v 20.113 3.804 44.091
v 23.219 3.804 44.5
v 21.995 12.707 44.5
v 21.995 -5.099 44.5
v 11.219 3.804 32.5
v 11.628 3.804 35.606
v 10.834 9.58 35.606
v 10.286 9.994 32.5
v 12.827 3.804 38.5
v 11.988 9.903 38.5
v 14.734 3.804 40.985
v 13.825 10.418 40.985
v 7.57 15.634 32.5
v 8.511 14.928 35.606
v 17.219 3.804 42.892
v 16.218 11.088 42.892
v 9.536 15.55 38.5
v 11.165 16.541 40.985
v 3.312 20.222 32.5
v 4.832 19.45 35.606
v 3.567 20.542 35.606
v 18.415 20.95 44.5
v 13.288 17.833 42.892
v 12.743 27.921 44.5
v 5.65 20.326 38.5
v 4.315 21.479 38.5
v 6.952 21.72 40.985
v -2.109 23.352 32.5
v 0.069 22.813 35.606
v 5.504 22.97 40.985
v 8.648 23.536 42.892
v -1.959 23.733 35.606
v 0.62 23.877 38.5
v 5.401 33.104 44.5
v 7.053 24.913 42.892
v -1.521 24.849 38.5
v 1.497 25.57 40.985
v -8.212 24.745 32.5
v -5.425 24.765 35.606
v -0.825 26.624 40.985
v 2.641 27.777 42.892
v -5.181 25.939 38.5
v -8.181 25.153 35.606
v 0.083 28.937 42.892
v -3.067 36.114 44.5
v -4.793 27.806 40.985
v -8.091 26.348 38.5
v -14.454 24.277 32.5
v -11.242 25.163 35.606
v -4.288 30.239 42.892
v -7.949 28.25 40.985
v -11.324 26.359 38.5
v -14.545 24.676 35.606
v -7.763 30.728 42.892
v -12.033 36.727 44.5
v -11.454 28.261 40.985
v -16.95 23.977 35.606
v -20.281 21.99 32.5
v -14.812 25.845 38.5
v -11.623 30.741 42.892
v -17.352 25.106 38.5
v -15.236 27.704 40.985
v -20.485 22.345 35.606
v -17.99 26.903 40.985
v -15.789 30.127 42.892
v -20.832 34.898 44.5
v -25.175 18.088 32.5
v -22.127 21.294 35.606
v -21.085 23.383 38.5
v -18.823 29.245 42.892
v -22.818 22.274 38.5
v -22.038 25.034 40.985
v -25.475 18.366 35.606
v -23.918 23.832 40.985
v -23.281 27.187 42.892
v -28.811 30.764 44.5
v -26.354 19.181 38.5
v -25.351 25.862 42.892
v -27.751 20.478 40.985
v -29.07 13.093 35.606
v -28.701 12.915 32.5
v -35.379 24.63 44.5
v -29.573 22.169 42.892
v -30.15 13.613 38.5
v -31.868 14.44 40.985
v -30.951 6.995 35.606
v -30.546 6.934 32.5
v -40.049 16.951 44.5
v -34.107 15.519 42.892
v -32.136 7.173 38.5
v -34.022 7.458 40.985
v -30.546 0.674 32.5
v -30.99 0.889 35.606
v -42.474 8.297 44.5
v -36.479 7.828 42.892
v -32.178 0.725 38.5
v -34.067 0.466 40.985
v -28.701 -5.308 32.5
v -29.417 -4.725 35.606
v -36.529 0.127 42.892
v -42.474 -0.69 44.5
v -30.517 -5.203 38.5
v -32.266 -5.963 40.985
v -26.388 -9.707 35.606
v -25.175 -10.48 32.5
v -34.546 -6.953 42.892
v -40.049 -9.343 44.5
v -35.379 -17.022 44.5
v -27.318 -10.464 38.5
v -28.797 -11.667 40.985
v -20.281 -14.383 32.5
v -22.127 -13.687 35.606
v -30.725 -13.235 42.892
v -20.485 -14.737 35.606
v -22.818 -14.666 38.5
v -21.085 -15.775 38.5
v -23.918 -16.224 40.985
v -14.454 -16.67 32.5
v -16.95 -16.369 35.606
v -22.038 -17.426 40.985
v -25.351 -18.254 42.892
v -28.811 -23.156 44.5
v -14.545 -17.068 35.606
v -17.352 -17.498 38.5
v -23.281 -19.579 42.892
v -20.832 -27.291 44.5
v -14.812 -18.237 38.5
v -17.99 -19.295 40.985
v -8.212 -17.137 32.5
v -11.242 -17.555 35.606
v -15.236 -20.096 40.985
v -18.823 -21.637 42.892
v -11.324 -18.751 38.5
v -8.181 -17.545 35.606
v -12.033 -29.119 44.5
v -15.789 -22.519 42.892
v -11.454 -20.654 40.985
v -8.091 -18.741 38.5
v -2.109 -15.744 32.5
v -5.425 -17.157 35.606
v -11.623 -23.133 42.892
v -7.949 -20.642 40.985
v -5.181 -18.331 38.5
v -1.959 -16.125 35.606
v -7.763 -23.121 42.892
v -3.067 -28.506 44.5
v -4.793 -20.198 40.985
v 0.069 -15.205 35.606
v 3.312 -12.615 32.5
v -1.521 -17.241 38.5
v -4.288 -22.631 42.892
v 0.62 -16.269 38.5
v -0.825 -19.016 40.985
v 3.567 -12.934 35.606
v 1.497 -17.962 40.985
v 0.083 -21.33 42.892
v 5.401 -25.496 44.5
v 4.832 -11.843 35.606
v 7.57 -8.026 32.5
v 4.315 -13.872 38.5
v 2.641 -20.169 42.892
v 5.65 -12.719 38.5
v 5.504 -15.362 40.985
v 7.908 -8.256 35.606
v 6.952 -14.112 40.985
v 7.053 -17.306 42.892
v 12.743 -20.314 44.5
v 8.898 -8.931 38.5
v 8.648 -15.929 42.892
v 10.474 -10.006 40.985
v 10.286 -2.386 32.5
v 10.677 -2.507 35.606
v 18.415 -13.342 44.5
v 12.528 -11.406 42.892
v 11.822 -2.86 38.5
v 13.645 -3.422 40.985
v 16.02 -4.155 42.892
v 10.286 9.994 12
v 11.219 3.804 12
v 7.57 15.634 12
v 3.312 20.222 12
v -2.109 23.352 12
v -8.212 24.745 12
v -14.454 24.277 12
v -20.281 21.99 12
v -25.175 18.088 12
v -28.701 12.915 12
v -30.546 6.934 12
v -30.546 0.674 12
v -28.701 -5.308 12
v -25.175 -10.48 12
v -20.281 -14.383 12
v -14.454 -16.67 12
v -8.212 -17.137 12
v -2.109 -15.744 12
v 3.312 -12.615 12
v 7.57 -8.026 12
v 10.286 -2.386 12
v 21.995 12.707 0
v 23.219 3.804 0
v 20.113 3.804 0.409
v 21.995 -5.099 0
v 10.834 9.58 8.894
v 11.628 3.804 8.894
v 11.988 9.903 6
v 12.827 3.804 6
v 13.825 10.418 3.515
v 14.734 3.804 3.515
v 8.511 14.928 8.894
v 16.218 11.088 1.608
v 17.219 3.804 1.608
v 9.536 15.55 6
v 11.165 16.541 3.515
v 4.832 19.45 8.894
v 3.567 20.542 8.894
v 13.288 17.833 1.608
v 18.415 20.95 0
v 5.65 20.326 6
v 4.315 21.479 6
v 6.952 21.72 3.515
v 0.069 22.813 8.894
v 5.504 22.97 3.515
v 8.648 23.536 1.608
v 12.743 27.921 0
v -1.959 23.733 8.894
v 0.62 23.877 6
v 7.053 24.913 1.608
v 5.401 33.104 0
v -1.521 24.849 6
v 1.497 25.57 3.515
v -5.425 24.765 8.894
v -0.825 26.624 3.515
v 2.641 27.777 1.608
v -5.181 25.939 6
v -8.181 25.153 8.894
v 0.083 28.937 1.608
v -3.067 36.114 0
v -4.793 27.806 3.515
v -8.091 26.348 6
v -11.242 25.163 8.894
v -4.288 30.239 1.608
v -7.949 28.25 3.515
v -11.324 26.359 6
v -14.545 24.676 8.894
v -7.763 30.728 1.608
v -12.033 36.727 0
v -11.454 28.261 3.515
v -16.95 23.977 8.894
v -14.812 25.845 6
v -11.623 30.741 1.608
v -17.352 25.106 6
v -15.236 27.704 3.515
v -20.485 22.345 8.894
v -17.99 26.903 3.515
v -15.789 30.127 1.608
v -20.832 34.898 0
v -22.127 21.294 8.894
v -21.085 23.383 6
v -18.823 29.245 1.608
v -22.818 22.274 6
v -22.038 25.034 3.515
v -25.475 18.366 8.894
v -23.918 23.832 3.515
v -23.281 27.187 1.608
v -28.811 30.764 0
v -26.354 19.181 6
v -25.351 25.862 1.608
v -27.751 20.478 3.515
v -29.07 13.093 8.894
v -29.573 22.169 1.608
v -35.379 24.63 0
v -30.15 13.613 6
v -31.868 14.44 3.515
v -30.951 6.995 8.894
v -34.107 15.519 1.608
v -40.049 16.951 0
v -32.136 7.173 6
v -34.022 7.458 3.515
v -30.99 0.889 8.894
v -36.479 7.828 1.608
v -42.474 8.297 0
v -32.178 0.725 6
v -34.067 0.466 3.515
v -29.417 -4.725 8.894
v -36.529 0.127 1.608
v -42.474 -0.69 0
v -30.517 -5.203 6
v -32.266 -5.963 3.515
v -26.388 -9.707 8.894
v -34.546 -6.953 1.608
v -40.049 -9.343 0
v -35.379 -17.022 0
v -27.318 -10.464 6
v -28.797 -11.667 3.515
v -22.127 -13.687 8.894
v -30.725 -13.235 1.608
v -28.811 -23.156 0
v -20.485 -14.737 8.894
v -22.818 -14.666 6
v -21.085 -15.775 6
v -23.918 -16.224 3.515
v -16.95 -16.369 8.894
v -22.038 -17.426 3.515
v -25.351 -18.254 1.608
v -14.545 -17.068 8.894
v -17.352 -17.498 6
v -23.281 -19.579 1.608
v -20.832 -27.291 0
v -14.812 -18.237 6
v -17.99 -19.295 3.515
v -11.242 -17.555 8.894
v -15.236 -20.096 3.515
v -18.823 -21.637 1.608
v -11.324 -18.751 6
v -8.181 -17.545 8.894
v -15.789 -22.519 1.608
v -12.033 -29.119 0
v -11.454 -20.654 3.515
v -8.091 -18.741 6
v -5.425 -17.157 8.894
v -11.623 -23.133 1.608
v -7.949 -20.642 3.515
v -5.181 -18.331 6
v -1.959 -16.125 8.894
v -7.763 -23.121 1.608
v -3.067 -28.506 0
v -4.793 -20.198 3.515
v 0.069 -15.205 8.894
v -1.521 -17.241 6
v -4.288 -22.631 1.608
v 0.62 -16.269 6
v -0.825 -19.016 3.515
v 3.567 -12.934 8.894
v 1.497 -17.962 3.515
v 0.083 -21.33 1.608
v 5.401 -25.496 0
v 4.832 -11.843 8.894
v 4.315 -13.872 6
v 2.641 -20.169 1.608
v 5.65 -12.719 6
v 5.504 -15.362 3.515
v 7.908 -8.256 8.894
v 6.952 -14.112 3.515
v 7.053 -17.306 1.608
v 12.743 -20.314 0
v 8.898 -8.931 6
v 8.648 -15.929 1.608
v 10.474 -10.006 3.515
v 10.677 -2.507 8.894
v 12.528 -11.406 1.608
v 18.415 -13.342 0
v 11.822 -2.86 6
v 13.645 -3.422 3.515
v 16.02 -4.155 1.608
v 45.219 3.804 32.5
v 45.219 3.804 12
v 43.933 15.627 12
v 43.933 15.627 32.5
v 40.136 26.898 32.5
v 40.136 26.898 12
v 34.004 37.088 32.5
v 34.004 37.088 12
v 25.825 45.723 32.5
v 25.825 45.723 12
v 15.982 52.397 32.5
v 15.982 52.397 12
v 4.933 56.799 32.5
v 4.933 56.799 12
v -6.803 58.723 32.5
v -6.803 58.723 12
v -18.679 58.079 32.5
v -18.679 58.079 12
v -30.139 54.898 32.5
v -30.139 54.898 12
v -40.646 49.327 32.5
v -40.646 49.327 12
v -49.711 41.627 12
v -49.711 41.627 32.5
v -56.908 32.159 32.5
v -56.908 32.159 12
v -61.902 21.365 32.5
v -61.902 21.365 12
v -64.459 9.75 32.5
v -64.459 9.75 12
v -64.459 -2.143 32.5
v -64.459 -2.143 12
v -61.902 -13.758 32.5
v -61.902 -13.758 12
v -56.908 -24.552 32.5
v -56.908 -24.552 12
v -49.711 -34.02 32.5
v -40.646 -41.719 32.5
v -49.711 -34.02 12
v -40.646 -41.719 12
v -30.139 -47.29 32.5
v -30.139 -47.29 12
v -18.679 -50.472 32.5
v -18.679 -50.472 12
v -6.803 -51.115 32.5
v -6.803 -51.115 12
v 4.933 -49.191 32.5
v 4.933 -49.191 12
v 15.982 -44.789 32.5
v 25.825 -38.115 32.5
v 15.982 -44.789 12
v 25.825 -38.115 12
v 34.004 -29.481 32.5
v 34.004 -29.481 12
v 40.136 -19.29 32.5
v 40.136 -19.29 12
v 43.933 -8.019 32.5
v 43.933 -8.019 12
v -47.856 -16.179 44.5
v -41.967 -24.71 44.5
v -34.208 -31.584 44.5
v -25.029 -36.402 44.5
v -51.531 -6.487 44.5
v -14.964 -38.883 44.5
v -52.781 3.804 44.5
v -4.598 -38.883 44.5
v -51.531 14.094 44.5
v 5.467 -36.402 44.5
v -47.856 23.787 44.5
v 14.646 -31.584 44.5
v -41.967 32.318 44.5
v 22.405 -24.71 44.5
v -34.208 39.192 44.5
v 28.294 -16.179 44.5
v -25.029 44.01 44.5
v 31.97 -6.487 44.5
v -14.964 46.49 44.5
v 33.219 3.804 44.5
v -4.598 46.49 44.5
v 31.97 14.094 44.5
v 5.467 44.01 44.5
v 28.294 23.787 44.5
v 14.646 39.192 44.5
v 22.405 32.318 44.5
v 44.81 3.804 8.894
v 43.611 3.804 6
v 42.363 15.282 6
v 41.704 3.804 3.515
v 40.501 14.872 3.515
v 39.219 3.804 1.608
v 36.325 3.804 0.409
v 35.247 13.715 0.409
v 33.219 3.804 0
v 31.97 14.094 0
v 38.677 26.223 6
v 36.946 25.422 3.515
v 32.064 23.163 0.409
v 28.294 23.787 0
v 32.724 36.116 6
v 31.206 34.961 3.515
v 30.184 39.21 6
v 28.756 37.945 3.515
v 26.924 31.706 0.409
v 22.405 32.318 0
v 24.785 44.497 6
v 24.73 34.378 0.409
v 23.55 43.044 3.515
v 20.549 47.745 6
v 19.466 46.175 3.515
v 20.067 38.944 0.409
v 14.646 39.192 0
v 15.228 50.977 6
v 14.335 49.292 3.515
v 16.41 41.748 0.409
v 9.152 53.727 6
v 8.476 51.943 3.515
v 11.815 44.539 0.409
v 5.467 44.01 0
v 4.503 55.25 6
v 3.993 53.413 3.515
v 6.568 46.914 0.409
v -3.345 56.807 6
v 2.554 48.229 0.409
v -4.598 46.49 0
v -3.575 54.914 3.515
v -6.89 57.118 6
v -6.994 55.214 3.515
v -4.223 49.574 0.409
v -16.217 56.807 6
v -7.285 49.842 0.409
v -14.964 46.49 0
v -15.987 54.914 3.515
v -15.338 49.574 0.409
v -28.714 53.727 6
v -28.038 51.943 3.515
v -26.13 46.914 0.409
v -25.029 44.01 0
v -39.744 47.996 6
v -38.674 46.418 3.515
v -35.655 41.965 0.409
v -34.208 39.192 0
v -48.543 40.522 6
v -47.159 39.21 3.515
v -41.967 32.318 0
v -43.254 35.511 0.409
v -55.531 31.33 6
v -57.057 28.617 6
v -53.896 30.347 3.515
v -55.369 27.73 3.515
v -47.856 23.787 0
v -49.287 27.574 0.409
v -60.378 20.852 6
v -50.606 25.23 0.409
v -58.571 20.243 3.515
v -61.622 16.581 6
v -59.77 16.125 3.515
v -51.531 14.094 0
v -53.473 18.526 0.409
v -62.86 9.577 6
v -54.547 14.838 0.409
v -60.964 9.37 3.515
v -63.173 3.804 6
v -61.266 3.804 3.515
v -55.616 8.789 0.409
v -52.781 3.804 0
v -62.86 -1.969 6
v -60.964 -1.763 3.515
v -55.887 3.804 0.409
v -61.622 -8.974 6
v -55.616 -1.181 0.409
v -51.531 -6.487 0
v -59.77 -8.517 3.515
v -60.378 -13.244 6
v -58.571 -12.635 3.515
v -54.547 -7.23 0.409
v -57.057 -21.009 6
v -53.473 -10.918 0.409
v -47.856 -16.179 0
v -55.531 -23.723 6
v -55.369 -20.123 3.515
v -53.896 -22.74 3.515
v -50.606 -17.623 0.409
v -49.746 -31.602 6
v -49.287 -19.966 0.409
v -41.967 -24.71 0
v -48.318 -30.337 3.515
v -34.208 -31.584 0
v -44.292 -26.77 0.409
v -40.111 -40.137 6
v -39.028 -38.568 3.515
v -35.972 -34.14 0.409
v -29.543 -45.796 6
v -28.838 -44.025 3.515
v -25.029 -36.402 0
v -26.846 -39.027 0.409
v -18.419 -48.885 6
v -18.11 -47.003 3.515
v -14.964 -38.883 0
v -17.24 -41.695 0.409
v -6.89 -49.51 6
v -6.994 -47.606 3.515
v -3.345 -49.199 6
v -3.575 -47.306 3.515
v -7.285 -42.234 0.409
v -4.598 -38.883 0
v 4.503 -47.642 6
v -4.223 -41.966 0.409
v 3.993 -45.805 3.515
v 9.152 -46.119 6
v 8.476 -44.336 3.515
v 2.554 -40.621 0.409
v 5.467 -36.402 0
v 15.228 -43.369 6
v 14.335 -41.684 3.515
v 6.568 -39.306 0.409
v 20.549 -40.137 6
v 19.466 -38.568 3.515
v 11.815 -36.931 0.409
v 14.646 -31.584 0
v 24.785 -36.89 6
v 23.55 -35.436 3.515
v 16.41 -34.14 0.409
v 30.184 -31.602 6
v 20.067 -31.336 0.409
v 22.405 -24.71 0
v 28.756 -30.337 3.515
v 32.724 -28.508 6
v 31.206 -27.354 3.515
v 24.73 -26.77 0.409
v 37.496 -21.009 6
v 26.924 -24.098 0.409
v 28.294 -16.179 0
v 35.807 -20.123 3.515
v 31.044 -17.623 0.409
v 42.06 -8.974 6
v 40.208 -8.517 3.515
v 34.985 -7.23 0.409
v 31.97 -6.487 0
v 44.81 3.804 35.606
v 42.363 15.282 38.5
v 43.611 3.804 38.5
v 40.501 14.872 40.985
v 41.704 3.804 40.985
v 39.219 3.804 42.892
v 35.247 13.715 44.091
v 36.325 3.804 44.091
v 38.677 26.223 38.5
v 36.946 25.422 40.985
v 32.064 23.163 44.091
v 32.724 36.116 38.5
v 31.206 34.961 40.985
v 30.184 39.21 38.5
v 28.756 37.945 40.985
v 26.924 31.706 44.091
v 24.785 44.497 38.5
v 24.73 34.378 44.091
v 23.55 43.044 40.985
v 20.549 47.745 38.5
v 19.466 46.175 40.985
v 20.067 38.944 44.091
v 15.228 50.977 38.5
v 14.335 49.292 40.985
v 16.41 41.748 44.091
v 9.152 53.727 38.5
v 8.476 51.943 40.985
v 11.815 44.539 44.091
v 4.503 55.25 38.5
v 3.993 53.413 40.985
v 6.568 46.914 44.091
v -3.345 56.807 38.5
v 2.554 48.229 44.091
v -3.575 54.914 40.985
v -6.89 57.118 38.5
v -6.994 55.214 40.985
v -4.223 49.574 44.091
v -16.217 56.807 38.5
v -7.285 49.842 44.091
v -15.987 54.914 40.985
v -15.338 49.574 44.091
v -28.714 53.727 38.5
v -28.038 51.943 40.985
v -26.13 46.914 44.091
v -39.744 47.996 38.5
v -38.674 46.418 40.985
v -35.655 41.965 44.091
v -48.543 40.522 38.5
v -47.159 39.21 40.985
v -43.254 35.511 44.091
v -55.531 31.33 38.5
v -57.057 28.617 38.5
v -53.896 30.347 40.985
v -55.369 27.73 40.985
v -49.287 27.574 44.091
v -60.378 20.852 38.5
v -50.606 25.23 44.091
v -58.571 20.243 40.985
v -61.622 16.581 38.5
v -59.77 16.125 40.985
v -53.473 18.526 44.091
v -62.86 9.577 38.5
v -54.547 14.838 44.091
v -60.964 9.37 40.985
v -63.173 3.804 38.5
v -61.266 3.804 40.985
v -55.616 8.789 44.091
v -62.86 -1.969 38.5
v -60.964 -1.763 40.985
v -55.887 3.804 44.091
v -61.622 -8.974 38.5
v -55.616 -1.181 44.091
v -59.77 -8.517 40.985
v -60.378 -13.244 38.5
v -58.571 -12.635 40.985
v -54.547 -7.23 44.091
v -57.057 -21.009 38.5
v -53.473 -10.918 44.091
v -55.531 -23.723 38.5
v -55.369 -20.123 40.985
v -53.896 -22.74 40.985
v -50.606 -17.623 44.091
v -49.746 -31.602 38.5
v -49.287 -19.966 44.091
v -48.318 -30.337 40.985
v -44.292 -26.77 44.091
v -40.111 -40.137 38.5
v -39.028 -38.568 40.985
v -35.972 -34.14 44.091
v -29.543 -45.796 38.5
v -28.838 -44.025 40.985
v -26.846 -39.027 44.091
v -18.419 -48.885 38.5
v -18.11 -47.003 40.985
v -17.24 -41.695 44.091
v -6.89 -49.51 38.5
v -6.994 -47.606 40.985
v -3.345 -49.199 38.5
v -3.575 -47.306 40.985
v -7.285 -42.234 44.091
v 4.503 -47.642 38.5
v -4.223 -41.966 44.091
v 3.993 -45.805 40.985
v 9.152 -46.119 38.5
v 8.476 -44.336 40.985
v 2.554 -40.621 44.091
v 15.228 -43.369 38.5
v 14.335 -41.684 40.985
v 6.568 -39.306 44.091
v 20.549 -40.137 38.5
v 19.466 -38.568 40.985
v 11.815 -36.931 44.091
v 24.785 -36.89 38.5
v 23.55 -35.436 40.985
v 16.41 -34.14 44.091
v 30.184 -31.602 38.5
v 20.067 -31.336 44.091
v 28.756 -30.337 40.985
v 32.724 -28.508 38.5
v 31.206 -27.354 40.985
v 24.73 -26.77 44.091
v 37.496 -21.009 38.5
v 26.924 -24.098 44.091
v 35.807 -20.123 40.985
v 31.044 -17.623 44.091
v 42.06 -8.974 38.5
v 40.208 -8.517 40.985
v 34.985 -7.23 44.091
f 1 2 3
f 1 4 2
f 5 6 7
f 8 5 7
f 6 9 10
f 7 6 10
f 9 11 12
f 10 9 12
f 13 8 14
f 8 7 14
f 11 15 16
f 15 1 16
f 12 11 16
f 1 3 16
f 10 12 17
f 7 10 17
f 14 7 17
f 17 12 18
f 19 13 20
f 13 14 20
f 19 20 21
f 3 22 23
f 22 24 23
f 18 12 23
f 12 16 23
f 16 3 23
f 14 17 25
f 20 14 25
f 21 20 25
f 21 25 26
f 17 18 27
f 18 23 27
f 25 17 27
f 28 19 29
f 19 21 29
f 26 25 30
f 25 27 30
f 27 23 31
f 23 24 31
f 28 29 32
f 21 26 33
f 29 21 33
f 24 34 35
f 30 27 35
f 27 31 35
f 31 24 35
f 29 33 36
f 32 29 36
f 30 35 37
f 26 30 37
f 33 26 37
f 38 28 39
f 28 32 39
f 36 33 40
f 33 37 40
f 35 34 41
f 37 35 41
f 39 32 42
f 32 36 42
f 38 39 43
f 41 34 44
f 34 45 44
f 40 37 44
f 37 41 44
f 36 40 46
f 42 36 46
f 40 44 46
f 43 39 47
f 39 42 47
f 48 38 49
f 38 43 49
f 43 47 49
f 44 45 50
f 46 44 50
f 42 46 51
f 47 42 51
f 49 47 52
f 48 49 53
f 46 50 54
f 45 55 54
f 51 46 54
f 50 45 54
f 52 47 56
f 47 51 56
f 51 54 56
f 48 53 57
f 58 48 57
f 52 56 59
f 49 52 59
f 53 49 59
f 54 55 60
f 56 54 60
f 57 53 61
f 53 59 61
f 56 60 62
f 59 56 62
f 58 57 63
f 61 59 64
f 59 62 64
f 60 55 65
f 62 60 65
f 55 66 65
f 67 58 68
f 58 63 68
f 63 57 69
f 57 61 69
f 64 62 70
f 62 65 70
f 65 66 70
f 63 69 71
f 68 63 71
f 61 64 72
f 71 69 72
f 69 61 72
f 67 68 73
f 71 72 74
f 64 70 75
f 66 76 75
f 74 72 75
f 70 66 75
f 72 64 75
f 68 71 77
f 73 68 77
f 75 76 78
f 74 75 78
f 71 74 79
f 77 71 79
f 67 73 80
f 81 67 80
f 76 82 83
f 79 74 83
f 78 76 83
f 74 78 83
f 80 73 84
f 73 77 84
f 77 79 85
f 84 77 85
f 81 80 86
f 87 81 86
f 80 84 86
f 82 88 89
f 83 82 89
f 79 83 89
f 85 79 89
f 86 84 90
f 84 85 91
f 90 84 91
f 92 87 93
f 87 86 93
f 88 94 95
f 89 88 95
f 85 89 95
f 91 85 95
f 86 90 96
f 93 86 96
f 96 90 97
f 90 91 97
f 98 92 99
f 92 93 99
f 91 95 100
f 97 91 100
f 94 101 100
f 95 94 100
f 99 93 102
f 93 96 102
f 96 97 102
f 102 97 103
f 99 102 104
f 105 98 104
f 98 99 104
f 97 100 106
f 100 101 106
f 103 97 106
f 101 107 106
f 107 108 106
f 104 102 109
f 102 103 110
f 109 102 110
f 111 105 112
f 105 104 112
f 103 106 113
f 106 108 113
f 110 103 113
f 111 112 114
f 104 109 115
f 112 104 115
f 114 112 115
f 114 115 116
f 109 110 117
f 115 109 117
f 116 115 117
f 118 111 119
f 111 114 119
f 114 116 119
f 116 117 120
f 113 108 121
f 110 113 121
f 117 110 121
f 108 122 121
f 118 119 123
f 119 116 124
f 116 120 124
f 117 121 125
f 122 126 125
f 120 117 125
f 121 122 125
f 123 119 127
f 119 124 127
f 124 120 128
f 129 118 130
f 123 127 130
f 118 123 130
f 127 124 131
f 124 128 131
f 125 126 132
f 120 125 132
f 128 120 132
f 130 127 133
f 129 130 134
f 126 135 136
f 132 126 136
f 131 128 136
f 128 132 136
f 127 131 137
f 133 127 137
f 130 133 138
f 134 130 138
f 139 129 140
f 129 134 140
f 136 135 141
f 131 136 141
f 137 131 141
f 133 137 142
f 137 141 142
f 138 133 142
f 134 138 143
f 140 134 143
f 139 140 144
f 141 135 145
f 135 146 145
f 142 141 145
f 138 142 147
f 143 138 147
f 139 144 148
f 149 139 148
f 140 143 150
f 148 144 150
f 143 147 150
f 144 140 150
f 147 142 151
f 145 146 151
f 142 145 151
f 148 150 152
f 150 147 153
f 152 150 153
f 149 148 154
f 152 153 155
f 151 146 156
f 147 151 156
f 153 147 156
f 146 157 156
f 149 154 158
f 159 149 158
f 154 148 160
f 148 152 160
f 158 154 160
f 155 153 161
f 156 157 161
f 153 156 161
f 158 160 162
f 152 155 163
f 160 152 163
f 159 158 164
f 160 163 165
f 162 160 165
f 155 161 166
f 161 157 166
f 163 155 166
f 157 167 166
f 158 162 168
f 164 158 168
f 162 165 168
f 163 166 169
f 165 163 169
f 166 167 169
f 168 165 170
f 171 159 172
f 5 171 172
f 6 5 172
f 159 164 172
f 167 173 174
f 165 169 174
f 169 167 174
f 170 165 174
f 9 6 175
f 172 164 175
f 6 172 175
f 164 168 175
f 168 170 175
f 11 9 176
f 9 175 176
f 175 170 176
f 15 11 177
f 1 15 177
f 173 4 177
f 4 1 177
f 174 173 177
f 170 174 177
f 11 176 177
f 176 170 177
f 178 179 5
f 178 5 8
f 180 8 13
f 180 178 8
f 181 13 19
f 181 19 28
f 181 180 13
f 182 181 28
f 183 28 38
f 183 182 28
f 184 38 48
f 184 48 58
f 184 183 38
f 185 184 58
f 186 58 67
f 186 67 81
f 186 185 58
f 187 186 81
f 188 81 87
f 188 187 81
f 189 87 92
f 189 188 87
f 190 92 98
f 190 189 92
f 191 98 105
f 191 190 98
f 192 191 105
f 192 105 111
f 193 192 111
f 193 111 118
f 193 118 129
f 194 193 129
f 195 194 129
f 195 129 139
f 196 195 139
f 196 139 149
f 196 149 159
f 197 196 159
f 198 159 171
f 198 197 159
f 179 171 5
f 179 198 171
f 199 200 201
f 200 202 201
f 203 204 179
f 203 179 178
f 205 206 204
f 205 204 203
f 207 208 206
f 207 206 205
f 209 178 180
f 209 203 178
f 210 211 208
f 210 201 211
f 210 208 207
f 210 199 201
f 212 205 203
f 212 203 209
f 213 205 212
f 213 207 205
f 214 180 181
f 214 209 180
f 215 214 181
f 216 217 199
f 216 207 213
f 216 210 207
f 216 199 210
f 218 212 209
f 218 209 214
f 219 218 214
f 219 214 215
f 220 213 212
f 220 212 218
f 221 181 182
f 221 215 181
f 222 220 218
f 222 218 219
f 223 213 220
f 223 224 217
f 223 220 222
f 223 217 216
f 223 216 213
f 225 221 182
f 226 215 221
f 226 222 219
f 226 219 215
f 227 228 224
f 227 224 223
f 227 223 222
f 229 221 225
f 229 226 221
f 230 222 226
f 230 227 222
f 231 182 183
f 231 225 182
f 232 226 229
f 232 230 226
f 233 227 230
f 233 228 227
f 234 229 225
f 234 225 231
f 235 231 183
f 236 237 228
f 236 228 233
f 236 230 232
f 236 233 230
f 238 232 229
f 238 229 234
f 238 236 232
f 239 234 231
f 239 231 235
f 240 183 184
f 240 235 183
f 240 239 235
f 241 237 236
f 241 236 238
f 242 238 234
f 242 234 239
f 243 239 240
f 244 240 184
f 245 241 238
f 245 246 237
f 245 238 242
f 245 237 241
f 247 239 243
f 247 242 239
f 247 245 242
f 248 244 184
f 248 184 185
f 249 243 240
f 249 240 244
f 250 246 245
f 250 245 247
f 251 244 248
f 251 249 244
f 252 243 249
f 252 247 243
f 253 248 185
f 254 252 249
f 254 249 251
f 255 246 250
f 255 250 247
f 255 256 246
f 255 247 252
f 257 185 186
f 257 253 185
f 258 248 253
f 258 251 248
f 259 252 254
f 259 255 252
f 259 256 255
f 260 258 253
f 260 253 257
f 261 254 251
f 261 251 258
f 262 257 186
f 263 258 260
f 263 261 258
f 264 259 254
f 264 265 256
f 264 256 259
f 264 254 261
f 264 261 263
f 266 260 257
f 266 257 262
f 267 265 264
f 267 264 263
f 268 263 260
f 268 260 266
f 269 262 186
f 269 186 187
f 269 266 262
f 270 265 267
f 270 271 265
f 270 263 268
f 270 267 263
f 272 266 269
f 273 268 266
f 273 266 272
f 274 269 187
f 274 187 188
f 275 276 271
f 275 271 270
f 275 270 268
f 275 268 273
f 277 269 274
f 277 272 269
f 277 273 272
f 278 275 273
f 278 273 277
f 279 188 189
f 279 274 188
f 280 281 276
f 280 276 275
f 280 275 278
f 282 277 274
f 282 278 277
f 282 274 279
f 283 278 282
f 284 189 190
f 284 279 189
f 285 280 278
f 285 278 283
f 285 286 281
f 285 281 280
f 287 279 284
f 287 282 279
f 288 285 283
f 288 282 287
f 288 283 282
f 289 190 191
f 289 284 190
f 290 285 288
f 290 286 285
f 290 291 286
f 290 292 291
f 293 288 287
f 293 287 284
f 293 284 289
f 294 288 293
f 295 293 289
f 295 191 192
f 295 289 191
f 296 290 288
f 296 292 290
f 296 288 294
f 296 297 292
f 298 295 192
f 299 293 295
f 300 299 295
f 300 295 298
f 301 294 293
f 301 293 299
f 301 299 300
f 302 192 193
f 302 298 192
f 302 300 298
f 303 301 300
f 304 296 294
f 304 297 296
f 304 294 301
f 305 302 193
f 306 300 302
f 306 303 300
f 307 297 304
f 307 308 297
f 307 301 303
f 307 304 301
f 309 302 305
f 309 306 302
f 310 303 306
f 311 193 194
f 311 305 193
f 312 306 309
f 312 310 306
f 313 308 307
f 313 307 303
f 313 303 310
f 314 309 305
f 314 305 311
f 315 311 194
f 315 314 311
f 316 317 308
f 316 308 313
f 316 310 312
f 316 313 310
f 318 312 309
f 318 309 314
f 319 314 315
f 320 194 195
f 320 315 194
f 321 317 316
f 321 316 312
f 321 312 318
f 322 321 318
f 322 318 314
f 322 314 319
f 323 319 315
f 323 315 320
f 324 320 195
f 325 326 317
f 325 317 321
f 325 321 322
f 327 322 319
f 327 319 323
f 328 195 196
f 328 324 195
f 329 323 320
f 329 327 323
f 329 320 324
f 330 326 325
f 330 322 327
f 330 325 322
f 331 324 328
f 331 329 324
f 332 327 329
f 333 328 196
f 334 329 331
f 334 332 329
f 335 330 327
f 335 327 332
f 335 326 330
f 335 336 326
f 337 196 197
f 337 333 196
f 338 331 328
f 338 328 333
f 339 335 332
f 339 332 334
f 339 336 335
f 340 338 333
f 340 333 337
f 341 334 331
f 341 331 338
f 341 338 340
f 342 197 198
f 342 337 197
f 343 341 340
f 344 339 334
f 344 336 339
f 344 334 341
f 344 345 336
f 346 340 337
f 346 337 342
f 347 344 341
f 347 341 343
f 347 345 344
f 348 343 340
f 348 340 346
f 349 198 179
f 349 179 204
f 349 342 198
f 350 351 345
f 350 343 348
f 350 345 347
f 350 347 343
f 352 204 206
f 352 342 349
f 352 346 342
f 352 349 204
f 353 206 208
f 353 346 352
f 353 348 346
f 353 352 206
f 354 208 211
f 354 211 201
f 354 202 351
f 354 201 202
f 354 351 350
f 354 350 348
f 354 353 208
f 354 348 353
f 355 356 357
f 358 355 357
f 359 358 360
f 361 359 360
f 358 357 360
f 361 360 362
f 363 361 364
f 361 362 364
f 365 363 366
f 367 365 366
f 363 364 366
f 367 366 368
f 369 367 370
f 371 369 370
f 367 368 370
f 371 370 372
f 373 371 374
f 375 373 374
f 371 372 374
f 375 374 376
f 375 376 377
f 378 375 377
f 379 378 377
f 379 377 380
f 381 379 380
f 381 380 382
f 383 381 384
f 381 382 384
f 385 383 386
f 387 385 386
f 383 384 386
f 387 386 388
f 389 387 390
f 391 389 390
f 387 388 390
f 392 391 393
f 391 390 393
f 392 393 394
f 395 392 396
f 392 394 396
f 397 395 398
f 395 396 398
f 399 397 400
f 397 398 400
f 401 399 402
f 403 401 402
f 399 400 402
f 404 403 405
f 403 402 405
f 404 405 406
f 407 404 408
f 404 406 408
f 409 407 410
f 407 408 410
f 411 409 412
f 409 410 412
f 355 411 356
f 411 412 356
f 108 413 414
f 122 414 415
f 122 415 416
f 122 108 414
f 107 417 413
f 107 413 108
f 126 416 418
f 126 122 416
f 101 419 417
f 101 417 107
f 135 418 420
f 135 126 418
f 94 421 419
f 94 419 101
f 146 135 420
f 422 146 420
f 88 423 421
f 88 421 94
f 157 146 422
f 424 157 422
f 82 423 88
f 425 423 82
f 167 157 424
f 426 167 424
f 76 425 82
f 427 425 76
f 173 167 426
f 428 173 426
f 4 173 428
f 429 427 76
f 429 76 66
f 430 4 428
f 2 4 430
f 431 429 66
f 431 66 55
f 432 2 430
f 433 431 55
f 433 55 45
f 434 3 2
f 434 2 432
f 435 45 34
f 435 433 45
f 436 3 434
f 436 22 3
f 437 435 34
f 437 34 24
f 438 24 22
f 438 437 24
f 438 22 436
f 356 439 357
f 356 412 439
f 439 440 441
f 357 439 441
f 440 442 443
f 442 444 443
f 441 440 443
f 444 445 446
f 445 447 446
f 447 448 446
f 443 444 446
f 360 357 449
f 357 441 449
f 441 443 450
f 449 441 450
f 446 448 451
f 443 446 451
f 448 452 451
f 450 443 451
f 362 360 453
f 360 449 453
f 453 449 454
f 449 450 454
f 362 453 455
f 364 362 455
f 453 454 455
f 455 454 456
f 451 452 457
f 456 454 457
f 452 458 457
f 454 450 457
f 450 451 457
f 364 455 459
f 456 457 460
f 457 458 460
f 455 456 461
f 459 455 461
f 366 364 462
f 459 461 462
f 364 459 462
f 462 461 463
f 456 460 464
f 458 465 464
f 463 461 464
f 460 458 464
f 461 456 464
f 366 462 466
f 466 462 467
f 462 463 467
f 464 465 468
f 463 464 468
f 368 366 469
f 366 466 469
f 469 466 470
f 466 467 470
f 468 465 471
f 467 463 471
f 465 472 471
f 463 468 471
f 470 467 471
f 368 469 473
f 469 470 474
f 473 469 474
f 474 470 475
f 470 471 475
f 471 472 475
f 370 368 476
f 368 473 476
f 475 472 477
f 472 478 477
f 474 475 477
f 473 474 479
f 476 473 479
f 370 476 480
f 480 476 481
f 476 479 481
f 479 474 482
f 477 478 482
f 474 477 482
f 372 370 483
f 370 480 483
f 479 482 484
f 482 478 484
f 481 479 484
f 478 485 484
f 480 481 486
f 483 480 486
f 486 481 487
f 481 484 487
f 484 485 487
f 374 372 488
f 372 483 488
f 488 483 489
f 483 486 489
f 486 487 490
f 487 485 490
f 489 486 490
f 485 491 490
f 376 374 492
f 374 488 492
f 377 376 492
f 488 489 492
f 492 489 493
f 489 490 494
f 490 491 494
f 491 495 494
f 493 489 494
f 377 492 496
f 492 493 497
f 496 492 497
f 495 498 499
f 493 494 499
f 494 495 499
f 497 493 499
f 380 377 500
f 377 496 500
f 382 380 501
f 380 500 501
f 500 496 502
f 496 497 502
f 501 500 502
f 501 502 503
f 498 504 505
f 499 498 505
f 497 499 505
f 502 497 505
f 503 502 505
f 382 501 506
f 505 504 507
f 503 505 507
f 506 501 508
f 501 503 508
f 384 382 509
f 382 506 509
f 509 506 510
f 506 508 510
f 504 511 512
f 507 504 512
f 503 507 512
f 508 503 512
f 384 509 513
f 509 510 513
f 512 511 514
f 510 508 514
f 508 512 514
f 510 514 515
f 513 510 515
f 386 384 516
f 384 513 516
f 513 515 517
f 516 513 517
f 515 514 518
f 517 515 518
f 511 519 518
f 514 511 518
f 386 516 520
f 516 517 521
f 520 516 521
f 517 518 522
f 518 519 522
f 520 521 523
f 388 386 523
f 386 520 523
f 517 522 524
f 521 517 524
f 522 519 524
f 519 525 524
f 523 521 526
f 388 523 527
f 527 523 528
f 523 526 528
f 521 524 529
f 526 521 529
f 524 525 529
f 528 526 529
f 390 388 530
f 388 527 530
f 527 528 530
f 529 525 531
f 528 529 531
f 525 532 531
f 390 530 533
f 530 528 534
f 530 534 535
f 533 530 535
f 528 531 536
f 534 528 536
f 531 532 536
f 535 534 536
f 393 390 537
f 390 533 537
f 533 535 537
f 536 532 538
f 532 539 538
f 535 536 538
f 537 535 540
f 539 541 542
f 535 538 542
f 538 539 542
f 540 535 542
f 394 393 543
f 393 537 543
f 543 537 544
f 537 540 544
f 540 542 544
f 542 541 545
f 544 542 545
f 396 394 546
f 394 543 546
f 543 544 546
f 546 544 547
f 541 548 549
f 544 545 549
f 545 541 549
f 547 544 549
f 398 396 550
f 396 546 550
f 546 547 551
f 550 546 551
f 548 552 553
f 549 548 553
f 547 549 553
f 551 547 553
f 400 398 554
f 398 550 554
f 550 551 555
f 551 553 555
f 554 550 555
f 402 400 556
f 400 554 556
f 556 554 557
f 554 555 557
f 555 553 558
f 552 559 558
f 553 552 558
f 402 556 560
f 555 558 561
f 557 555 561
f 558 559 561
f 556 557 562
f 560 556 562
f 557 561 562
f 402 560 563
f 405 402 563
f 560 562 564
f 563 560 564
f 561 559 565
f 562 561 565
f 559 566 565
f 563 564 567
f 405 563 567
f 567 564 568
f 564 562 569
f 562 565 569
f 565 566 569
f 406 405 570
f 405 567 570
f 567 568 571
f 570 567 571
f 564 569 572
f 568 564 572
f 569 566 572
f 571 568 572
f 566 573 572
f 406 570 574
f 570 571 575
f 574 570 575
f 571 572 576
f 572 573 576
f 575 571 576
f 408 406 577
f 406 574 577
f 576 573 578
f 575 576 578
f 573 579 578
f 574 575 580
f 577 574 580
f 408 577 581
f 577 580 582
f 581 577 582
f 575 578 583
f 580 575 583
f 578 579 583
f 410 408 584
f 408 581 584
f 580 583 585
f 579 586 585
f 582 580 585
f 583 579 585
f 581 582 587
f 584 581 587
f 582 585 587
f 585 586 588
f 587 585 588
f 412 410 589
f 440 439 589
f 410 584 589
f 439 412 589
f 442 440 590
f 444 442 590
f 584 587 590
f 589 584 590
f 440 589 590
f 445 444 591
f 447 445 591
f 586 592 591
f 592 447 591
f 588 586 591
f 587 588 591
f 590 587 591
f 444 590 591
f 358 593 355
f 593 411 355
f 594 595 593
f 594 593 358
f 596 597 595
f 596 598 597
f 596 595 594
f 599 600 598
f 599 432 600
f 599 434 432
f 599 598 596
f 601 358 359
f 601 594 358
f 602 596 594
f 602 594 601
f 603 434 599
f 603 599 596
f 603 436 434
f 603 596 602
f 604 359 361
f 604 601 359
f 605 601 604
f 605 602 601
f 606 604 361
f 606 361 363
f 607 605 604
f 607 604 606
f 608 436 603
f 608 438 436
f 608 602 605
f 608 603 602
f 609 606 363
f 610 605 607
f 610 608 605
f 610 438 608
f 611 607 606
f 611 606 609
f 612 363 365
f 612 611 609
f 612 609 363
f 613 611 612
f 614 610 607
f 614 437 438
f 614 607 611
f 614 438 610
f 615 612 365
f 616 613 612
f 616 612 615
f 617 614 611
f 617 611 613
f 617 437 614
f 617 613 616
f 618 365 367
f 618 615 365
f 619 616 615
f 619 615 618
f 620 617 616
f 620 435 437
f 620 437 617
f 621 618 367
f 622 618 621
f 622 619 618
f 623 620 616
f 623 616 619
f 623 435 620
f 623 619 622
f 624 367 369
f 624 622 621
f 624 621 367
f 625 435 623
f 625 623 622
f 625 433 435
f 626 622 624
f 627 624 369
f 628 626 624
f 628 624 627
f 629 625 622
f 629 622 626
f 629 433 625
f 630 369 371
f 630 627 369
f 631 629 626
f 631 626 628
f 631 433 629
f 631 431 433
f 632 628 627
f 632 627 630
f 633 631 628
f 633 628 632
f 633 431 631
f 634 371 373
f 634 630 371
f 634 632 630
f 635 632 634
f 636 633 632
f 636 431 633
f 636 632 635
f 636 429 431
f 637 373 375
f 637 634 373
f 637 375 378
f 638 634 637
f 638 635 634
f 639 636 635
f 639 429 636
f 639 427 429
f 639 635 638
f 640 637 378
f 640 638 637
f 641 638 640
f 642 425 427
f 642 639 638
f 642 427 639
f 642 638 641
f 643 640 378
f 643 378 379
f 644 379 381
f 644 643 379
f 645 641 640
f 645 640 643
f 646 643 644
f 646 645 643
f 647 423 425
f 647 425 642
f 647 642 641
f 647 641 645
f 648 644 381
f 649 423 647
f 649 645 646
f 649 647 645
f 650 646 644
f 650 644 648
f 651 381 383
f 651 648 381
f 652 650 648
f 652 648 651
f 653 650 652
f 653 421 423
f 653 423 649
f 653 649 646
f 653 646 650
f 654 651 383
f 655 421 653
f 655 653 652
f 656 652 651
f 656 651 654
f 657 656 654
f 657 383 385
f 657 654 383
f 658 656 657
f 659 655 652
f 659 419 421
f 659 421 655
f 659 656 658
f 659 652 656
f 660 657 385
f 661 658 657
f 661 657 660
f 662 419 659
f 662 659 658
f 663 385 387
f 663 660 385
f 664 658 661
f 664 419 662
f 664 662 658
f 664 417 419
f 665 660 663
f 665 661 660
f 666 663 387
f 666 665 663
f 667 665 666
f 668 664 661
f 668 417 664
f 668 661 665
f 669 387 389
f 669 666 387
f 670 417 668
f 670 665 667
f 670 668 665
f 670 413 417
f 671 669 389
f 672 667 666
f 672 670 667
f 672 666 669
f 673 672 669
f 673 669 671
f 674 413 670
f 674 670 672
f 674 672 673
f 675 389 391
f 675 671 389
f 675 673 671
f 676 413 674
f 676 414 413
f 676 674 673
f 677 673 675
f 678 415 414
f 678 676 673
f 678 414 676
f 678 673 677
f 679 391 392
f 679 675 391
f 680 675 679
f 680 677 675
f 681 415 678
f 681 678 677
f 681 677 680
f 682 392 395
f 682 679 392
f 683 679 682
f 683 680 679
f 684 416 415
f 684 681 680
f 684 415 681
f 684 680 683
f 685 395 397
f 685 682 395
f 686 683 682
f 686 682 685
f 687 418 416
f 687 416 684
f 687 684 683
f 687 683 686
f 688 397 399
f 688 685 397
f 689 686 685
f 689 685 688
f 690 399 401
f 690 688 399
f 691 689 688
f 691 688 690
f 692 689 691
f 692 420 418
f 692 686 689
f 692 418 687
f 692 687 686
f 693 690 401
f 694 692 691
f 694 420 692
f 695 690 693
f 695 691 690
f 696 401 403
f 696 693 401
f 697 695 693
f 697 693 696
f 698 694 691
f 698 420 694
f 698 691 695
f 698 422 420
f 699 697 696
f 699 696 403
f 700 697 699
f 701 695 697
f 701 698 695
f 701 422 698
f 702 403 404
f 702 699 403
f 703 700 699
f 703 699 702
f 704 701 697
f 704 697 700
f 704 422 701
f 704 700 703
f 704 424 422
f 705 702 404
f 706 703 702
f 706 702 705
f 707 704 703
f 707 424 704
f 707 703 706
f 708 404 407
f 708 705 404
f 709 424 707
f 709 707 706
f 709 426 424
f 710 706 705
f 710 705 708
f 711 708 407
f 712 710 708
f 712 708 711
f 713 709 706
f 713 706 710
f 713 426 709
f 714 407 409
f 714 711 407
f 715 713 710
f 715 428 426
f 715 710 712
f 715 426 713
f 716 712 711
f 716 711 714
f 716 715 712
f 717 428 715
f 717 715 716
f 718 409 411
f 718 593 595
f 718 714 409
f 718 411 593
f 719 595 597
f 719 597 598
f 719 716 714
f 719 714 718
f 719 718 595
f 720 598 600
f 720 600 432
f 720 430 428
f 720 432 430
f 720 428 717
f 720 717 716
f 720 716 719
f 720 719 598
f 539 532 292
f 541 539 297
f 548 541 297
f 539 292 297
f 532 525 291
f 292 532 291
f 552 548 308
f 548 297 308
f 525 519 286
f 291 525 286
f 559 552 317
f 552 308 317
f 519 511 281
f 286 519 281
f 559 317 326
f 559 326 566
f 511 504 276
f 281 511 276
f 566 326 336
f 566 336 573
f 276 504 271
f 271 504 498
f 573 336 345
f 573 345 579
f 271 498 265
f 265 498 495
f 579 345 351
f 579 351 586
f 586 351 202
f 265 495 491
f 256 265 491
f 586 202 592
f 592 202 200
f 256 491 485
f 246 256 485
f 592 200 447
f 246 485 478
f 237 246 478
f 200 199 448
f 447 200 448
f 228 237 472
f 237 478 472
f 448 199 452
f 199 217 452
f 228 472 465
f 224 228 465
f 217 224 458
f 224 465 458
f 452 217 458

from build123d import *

# Parameters (mm, degrees)
SKETCH2_R           = 55
SKETCH2_R_2         = 21
BOSS_EXTRUDE1_DEPTH = 44.5
FILLET1_R           = 12


with BuildPart() as part:
    # Sketch2 → Boss-Extrude1 (new body)
    with BuildSketch(Plane.XY):
        with Locations((-9.780925239, 3.803880586)):
            Circle(SKETCH2_R)
        with Locations((-9.780925239, 3.803880586)):
            Circle(SKETCH2_R_2, mode=Mode.SUBTRACT)
    extrude(amount=BOSS_EXTRUDE1_DEPTH)

    # Fillet1
    fillet1_edges = [part.edges().sort_by_distance(p)[0] for p in [
        (-64.780925239, 3.803880586, 0),
        (-64.780925239, 3.803880586, 44.5),
        (-30.780925239, 3.803880586, 0),
        (-30.780925239, 3.803880586, 44.5),
    ]]
    fillet(fillet1_edges, radius=FILLET1_R)


solid = part.part
